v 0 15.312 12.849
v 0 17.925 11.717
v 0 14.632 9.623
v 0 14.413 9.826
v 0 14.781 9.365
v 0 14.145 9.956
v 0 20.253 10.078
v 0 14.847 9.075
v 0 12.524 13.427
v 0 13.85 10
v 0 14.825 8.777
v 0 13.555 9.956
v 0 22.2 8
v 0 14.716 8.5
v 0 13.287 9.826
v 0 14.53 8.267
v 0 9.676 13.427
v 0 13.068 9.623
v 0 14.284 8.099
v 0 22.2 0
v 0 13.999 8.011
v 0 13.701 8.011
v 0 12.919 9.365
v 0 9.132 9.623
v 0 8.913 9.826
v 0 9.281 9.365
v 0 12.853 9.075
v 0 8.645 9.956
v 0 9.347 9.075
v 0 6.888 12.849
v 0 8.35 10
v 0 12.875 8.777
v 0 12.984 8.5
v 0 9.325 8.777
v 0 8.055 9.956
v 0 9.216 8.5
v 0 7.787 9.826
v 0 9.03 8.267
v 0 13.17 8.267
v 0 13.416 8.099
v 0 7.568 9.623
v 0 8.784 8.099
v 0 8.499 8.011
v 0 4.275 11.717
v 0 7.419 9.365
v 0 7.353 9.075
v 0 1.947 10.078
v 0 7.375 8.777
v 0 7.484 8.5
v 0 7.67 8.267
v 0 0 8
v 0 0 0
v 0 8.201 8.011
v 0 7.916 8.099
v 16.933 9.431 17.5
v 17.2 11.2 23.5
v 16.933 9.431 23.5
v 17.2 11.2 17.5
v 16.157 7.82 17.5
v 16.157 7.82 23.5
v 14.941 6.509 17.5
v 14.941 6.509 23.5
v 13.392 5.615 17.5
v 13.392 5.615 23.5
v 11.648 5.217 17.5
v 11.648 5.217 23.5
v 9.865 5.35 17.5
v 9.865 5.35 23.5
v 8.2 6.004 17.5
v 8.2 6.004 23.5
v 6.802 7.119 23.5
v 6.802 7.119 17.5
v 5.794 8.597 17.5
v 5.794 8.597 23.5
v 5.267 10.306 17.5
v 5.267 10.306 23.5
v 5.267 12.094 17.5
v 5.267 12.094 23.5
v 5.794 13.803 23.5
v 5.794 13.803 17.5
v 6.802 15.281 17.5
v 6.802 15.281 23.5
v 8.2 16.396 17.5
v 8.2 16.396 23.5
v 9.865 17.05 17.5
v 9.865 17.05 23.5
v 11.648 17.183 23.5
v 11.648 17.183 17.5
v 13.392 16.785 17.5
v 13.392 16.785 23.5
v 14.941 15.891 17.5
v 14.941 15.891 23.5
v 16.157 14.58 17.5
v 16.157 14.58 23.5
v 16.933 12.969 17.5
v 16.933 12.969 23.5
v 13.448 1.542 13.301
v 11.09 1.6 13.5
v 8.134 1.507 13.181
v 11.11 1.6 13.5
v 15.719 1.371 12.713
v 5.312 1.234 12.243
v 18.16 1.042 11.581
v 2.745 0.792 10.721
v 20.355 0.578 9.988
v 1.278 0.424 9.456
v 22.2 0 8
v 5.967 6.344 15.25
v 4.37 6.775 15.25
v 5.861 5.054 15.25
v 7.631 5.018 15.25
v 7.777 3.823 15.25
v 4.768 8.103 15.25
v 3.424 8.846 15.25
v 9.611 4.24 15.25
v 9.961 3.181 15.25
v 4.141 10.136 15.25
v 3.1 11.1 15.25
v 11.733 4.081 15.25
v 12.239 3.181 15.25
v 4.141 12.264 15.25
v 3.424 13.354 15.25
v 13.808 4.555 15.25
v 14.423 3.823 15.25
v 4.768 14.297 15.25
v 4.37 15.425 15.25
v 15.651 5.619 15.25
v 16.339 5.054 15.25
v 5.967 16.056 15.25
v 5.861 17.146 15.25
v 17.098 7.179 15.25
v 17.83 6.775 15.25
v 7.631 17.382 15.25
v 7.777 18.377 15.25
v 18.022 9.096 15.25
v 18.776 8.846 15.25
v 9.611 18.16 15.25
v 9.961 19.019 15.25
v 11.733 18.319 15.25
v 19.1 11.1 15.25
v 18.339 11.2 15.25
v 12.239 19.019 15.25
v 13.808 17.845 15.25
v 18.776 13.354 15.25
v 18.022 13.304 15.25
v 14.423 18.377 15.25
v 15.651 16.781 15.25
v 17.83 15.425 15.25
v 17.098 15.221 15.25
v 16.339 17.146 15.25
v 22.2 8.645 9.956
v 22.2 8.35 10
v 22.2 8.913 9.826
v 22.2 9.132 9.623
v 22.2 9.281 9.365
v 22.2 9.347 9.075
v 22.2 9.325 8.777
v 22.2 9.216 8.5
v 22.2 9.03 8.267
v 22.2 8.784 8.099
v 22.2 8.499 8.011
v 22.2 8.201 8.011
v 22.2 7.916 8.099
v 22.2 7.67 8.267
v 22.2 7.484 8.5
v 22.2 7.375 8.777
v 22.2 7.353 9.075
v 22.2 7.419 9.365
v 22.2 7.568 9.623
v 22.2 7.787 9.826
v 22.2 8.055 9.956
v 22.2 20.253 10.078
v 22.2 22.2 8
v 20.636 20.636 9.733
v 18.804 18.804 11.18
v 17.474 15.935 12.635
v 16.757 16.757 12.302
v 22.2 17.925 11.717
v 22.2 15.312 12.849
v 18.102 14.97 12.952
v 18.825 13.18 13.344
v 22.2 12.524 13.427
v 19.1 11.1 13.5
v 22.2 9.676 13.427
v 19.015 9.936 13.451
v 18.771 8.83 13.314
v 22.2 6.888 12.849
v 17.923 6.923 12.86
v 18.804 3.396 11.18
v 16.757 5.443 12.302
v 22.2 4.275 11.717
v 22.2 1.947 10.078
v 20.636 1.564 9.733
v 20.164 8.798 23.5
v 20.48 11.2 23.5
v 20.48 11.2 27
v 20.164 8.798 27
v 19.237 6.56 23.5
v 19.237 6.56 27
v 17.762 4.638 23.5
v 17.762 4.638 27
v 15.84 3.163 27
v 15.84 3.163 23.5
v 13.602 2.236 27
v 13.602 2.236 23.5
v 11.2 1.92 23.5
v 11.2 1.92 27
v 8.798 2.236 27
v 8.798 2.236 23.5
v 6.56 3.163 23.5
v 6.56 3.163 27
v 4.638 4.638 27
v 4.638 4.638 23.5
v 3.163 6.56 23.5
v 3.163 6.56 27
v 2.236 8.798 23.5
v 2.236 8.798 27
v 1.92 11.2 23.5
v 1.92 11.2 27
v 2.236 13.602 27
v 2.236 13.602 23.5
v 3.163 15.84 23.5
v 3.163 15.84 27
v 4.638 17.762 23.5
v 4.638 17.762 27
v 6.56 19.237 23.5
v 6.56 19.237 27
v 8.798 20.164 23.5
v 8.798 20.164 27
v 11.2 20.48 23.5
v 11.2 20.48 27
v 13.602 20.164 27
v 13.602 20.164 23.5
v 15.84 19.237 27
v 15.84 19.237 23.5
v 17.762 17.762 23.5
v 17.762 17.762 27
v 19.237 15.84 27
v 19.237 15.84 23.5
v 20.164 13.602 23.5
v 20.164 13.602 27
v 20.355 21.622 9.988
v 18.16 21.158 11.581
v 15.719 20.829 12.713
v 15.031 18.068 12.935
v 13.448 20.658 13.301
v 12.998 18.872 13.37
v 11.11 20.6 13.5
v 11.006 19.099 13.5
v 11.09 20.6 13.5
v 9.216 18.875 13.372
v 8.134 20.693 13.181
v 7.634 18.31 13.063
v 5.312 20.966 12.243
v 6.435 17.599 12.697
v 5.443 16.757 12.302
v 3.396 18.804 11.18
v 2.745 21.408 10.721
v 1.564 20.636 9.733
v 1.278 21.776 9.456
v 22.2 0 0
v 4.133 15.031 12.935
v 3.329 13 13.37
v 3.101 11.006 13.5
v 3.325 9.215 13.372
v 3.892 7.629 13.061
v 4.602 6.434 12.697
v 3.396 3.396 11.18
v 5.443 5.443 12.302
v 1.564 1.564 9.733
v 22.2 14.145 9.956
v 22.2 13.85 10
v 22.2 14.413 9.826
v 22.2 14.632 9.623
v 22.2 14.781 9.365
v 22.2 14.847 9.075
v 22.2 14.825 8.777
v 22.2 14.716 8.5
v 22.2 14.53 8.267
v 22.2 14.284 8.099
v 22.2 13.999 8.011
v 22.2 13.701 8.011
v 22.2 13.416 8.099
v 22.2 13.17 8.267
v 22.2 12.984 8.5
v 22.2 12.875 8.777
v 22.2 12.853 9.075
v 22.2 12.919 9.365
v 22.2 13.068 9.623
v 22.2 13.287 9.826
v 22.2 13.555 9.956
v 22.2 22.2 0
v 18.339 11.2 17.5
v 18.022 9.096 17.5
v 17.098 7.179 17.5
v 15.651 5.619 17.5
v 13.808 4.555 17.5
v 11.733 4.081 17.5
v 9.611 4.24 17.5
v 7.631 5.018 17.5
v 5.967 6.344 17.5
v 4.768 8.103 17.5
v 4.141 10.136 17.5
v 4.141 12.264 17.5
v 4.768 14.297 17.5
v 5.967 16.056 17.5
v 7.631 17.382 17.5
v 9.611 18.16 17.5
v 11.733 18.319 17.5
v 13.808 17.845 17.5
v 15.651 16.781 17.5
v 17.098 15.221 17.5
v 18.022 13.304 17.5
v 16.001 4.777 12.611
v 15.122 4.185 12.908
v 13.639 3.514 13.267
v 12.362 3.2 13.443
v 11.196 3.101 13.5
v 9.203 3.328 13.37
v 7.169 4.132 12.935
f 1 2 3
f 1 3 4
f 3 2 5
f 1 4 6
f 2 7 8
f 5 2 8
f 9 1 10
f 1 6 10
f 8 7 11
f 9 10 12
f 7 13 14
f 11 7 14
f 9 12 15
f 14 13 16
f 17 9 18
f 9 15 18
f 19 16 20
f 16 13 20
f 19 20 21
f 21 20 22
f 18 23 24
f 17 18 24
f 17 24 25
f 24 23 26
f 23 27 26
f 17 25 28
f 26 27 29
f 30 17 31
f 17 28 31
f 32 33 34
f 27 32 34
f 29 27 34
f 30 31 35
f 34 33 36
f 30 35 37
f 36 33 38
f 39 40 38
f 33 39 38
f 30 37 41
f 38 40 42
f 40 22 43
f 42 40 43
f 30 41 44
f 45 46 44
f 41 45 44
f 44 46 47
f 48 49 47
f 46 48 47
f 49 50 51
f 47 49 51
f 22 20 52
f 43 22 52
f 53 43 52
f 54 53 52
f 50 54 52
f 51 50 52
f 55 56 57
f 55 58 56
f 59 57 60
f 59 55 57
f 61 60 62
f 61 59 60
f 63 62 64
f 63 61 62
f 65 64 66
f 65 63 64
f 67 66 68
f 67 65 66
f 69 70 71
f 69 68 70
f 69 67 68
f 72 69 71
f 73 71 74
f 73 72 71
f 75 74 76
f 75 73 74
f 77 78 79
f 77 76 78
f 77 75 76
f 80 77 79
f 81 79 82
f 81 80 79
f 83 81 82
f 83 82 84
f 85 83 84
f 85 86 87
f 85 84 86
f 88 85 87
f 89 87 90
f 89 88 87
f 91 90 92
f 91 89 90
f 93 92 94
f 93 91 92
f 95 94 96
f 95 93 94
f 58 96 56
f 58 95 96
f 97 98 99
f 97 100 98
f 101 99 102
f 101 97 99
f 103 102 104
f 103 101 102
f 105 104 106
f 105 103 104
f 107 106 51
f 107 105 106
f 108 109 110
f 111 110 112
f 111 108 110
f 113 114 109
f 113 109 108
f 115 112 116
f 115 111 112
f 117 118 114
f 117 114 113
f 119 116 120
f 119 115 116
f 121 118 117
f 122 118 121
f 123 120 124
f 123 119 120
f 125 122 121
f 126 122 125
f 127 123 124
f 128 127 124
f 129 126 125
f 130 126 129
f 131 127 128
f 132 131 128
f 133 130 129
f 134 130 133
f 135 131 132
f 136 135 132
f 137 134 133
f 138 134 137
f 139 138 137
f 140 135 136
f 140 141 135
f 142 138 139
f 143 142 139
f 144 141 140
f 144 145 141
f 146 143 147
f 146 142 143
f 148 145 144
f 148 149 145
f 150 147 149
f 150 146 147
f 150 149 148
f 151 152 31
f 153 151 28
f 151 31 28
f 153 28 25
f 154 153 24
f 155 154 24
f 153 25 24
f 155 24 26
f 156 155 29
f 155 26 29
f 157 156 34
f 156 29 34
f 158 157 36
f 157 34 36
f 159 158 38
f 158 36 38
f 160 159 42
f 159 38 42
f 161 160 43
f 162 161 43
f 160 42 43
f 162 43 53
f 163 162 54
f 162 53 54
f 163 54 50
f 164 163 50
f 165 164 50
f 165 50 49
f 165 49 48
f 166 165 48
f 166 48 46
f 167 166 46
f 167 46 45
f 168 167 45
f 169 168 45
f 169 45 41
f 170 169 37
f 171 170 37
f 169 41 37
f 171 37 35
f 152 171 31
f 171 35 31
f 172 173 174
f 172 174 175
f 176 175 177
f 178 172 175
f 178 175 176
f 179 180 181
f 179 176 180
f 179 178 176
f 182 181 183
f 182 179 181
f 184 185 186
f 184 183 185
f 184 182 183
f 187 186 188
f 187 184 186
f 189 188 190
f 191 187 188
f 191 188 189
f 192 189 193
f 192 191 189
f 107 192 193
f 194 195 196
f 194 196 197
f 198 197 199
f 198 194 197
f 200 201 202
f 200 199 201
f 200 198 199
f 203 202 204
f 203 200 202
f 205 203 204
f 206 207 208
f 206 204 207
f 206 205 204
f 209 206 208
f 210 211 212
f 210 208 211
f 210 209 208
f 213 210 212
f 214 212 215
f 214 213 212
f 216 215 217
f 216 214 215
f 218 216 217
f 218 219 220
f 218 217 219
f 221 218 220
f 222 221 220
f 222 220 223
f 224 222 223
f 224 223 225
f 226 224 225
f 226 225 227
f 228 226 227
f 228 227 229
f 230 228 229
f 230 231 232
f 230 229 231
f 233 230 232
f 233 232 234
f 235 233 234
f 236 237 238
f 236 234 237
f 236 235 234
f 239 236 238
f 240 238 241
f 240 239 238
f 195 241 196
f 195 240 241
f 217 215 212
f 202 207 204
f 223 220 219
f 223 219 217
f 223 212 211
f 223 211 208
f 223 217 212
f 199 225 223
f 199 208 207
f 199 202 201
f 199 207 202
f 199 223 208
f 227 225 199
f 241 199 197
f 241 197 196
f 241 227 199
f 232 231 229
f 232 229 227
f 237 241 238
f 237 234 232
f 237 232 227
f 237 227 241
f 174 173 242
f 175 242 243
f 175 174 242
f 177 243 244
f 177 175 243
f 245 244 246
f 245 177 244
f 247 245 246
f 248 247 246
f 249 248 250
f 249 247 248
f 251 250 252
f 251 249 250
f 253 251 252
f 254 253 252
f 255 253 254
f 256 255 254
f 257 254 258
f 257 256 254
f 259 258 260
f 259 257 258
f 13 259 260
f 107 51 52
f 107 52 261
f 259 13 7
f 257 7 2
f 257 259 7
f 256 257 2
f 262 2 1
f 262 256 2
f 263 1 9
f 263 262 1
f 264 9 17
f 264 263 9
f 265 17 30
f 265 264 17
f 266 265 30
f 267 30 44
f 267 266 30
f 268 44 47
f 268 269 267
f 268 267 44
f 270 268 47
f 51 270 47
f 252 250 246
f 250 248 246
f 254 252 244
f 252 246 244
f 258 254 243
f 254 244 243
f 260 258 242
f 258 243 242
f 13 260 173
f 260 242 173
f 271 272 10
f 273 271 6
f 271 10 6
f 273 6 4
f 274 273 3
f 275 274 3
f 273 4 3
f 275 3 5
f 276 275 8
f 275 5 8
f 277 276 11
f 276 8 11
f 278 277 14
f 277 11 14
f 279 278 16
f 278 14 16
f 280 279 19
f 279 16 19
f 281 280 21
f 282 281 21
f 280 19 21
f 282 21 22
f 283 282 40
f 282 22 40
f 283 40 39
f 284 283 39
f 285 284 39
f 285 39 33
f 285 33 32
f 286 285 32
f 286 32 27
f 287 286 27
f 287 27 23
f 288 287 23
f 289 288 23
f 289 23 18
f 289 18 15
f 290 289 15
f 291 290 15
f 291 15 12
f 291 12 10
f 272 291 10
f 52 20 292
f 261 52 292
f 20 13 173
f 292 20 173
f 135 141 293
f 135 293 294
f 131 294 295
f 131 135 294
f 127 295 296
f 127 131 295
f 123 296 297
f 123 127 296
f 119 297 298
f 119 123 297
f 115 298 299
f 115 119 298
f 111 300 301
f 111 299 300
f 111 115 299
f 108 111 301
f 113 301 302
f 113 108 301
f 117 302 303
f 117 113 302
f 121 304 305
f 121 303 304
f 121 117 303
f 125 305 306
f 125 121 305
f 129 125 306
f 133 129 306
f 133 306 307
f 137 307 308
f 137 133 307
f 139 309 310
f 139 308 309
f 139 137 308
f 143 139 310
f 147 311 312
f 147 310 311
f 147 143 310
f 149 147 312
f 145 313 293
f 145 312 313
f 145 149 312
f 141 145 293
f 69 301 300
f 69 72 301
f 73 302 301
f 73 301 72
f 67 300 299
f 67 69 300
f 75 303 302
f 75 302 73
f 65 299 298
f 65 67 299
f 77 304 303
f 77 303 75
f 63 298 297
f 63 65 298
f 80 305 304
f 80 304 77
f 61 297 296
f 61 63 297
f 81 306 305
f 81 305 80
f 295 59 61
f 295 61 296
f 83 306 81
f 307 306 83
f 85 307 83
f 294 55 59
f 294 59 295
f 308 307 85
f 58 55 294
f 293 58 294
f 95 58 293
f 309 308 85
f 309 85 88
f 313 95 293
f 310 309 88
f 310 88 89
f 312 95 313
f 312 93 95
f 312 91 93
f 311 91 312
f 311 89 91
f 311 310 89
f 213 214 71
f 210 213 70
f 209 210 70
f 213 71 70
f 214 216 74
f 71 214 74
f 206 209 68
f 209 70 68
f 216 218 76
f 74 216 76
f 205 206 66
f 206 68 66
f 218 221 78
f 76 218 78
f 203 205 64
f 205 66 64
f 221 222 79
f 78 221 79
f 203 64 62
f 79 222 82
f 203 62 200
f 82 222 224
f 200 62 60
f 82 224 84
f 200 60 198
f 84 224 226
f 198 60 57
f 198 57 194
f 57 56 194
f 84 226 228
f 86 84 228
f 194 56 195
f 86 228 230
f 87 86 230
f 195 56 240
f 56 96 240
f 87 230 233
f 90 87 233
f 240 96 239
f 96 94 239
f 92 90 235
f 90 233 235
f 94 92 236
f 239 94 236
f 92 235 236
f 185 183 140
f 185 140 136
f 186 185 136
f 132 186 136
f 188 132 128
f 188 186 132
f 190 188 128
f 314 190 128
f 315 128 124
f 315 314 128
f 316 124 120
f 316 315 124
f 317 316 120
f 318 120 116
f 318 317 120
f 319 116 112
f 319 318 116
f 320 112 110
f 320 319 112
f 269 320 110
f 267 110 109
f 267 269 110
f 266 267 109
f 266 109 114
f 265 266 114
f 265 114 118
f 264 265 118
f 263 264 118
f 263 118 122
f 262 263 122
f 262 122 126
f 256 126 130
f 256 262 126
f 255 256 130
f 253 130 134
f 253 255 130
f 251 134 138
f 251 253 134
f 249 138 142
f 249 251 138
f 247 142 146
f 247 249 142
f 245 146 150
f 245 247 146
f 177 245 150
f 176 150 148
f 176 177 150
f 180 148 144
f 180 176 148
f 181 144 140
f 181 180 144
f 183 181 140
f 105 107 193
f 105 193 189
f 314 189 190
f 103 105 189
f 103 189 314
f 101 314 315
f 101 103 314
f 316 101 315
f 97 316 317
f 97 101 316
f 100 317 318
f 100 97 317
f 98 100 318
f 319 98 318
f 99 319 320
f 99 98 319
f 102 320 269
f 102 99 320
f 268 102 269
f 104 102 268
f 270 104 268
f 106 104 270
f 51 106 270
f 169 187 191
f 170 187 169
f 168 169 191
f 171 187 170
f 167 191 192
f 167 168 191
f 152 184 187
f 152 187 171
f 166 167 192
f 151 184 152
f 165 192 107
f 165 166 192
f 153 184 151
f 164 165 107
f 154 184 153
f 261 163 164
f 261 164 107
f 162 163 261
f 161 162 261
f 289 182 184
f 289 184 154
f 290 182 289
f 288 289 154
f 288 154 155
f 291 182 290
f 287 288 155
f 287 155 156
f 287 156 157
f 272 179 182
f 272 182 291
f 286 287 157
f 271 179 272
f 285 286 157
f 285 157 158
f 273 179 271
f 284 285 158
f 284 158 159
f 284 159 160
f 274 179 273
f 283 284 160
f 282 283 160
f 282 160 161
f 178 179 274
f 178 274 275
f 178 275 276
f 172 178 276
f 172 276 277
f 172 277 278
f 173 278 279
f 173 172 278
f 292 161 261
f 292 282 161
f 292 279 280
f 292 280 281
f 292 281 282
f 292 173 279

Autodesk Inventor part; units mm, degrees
ref_plane "XZ Plane" through (0, 0, 0) normal (0, 1, 0) x (-1, 0, 0)
sketch "Sketch1" plane through (0, 0, 0) normal (0, 0, 1) x (1, 0, 0)
  line L0 (0, 0) -> (22.2, 0)
  line L1 (22.2, 0) -> (22.2, 22.2)
  line L2 (22.2, 22.2) -> (0, 22.2)
  line L3 (0, 22.2) -> (0, 0)
  dimension "d0" = 22.2
  dimension "d1" = 22.2
extrude "Extrusion1" add sketch "Sketch1" along normal blind 8
sketch "Sketch2" plane through (0, 0, 8) normal (0, 0, 1) x (1, 0, 0)
  line L0 (0, 0) -> (22.2, 0) construction
  line L1 (22.2, 0) -> (22.2, 22.2) construction
  line L2 (22.2, 22.2) -> (0, 22.2) construction
  line L3 (0, 22.2) -> (0, 0) construction
  line L4 (22.2, 22.2) -> (0, 22.2) construction
  line L5 (11.1, 22.2) -> (11.1, 0) construction
  line L6 (0, 0) -> (22.2, 0) construction
  circle A0 centre (11.1, 11.1) radius 8
  dimension "d4" = 16
extrude "Extrusion2" add sketch "Sketch2" along normal blind 7.25
sketch "Sketch3" plane through (22.2, 0, 0) normal (1, 0, 0) x (0, 0, -1)
  line L0 (-15.25, 19.1) -> (-15.25, 3.1) construction
  line L1 (-15.25, 11.1) -> (0, 11.1) construction
  line L2 (0, 22.2) -> (0, 0) construction
sketch "Sketch5" plane through (0, 0, 0) normal (0, -1, 0) x (1, 0, 0)
  line L0 (0, 0) -> (22.2, 0) construction
  line L1 (22.2, 0) -> (22.2, 8) construction
  line L2 (0, 8) -> (22.2, 8) construction
  line L3 (0, 0) -> (0, 8) construction
  line L4 (0, 8) -> (22.2, 8) construction
  line L5 (11.1, 8) -> (11.1, 13.5) construction
  arc A0 (22.2, 8) -> (0, 8) centre (11.1, -0.4509) ccw
  line L6 (0, 8) -> (22.2, 8)
  dimension "d9" = 5.5
extrude "Extrusion4" add sketch "Sketch5" against normal up to surface (22.2 mm away)
sketch "Sketch6" plane through (22.2, 0, 0) normal (1, 0, 0) x (0, 0, -1)
  line L0 (0, 0) -> (0, 22.2) construction
  line L1 (0, 22.2) -> (-8, 22.2) construction
  line L2 (-8, 0) -> (-8, 22.2) construction
  line L3 (0, 0) -> (-8, 0) construction
  line L4 (-8, 0) -> (-8, 22.2) construction
  line L5 (-8, 11.1) -> (-13.5, 11.1) construction
  line L6 (0, 22.2) -> (-8, 22.2) projected
  line L7 (0, 0) -> (-8, 0) projected
  arc A0 (-8, 22.2) -> (-8, 0) centre (0.4509, 11.1) ccw
  line L8 (-8, 22.2) -> (-8, 0)
  dimension "d12" = 5.5
extrude "Extrusion5" add sketch "Sketch6" against normal up to surface (22.2 mm away)
sketch "Sketch7" plane through (22.2, 0, 0) normal (1, 0, 0) x (0, 0, -1)
  line L0 (0, 0) -> (0, 22.2) construction
  line L1 (0, 22.2) -> (-8, 22.2) construction
  arc A0 (-8, 22.2) -> (-8, 0) centre (0.4509, 11.1) ccw construction
  line L2 (0, 0) -> (-8, 0) construction
  arc A1 (-8, 22.2) -> (-8, 0) centre (0.4509, 11.1) ccw construction
  line L3 (-13.5, 11.1) -> (0, 11.1) construction
  line L4 (0, 22.2) -> (0, 0) construction
  line L5 (-13.5, 11.1) -> (-13.5, 20.6) construction
  line L6 (-13.5, 11.1) -> (-13.5, 1.6) construction
  line L7 (0, 0) -> (-8, 0) projected
  line L8 (-13.5, 1.6) -> (-8, 0)
  line L9 (-8, 0) -> (-13.5, 0)
  line L10 (0, 0) -> (-8, 0) projected
  line L11 (-13.5, 0) -> (-13.5, 1.6)
  line L12 (0, 22.2) -> (-8, 22.2) projected
  line L13 (-13.5, 20.6) -> (-8, 22.2)
  line L14 (-8, 22.2) -> (-13.5, 22.2)
  line L15 (-13.5, 22.2) -> (-13.5, 20.6)
  dimension "d15" = 9.5
extrude "Extrusion6" cut sketch "Sketch7" against normal up to surface (22.2 mm away)
sketch "Sketch9" plane through (0, 0, 15.25) normal (0, 0, 1) x (1, 0, 0)
  arc A0 (17.7247, 6.5709) -> (17.7247, 15.8291) centre (11.2, 11.2) ccw projected
  arc A1 (17.7247, 15.8291) -> (16.9166, 16.7965) centre (11.2, 11.2) ccw projected
  arc A2 (16.9166, 16.7965) -> (16.7965, 16.9166) centre (11.2, 11.2) ccw projected
  arc A3 (16.7965, 16.9166) -> (15.8291, 17.7247) centre (11.2, 11.2) ccw projected
  arc A4 (15.8291, 17.7247) -> (6.5709, 17.7247) centre (11.2, 11.2) ccw projected
  arc A5 (6.5709, 17.7247) -> (5.6035, 16.9166) centre (11.2, 11.2) ccw projected
  arc A6 (5.6035, 16.9166) -> (5.4834, 16.7965) centre (11.2, 11.2) ccw projected
  arc A7 (5.4834, 16.7965) -> (4.6753, 15.8291) centre (11.2, 11.2) ccw projected
  arc A8 (4.6753, 15.8291) -> (4.6753, 6.5709) centre (11.2, 11.2) ccw projected
  arc A9 (4.6753, 6.5709) -> (5.4834, 5.6035) centre (11.2, 11.2) ccw projected
  arc A10 (5.4834, 5.6035) -> (5.6035, 5.4834) centre (11.2, 11.2) ccw projected
  arc A11 (5.6035, 5.4834) -> (6.5709, 4.6753) centre (11.2, 11.2) ccw projected
  arc A12 (6.5709, 4.6753) -> (15.8291, 4.6753) centre (11.2, 11.2) ccw projected
  arc A13 (15.8291, 4.6753) -> (16.7965, 5.4834) centre (11.2, 11.2) ccw projected
  arc A14 (16.7965, 5.4834) -> (16.9166, 5.6035) centre (11.2, 11.2) ccw projected
  arc A15 (16.9166, 5.6035) -> (17.7247, 6.5709) centre (11.2, 11.2) ccw projected
  circle A16 centre (11.2, 11.2) radius 7.1389
  point P0 (0, 0)
extrude "Extrusion8" add sketch "Sketch9" along normal blind 2.25 contours A16
sketch "Sketch10" plane through (11.2, 11.2, 17.5) normal (0, 0, 1) x (1, 0, 0)
  circle A0 centre (0, 0) radius 8 projected
  circle A1 centre (0, 0) radius 6
  circle A2 centre (0, 0) radius 7
  point P0 (-11.2, -11.2)
  dimension "d25" = 2
  dimension "d36" = 1
extrude "Extrusion9" add sketch "Sketch10" along normal blind 6 contours A1
sketch "Sketch11" plane through (11.2, 11.2, 23.5) normal (0, 0, 1) x (1, 0, 0)
  circle A0 centre (0, 0) radius 6 projected
  circle A1 centre (0, 0) radius 9.28
  point P0 (-11.2, -11.2)
  dimension "d28" = 18.56
extrude "Extrusion10" add sketch "Sketch11" along normal blind 3.5 contours A0 | A1
sketch "Sketch12" plane through (22.2, 0, 0) normal (1, 0, 0) x (0, 0, -1)
  line L0 (-27, 20.48) -> (-27, 1.92) construction
  line L1 (-27, 11.2) -> (0, 11.1) construction
  line L2 (0, 0) -> (0, 22.2) construction
  dimension "d31" = 27.0002
ref_plane "Work Plane2" through (11.2, 0, 0) normal (1, 0, 0) x (0, 1, 0)
sketch "Sketch17" plane through (0, 0, 0) normal (-1, 0, 0) x (0, 0, 1)
  line L0 (0, 22.2) -> (0, 0) construction
  line L1 (0, 0) -> (8, 0) construction
  arc A0 (8, 0) -> (8, 22.2) centre (-0.4509, 11.1) ccw construction
  line L2 (0, 22.2) -> (8, 22.2) construction
  line L3 (0, 22.2) -> (0, 0) construction
  line L4 (0, 11.1) -> (9, 11.1) construction
  line L5 (9, 11.1) -> (9, 8.35) construction
  line L6 (17.5, 17.2) -> (23.5, 17.2) construction
  line L7 (9, 11.1) -> (9, 13.85) construction
  circle A1 centre (9, 8.35) radius 1
  circle A2 centre (9, 13.85) radius 1
  dimension "d48" = 9
  dimension "d49" = 2.75
  dimension "d50" = 2
  dimension "d52" = 2.75
  dimension "d53" = 2
extrude "Extrusion12" cut sketch "Sketch17" against normal through all
ref_plane "Work Plane4" through (11.1, 0, 0) normal (1, 0, 0) x (0, 0, -1)
sketch "Sketch18" plane through (11.1, 0, 0) normal (1, 0, 0) x (0, 0, -1)
  line L0 (0, 0) -> (0, 22.2) projected
  line L1 (0, 11.1) -> (-43.4569, 11.1)
properties part number "mini predator dummy camera"
